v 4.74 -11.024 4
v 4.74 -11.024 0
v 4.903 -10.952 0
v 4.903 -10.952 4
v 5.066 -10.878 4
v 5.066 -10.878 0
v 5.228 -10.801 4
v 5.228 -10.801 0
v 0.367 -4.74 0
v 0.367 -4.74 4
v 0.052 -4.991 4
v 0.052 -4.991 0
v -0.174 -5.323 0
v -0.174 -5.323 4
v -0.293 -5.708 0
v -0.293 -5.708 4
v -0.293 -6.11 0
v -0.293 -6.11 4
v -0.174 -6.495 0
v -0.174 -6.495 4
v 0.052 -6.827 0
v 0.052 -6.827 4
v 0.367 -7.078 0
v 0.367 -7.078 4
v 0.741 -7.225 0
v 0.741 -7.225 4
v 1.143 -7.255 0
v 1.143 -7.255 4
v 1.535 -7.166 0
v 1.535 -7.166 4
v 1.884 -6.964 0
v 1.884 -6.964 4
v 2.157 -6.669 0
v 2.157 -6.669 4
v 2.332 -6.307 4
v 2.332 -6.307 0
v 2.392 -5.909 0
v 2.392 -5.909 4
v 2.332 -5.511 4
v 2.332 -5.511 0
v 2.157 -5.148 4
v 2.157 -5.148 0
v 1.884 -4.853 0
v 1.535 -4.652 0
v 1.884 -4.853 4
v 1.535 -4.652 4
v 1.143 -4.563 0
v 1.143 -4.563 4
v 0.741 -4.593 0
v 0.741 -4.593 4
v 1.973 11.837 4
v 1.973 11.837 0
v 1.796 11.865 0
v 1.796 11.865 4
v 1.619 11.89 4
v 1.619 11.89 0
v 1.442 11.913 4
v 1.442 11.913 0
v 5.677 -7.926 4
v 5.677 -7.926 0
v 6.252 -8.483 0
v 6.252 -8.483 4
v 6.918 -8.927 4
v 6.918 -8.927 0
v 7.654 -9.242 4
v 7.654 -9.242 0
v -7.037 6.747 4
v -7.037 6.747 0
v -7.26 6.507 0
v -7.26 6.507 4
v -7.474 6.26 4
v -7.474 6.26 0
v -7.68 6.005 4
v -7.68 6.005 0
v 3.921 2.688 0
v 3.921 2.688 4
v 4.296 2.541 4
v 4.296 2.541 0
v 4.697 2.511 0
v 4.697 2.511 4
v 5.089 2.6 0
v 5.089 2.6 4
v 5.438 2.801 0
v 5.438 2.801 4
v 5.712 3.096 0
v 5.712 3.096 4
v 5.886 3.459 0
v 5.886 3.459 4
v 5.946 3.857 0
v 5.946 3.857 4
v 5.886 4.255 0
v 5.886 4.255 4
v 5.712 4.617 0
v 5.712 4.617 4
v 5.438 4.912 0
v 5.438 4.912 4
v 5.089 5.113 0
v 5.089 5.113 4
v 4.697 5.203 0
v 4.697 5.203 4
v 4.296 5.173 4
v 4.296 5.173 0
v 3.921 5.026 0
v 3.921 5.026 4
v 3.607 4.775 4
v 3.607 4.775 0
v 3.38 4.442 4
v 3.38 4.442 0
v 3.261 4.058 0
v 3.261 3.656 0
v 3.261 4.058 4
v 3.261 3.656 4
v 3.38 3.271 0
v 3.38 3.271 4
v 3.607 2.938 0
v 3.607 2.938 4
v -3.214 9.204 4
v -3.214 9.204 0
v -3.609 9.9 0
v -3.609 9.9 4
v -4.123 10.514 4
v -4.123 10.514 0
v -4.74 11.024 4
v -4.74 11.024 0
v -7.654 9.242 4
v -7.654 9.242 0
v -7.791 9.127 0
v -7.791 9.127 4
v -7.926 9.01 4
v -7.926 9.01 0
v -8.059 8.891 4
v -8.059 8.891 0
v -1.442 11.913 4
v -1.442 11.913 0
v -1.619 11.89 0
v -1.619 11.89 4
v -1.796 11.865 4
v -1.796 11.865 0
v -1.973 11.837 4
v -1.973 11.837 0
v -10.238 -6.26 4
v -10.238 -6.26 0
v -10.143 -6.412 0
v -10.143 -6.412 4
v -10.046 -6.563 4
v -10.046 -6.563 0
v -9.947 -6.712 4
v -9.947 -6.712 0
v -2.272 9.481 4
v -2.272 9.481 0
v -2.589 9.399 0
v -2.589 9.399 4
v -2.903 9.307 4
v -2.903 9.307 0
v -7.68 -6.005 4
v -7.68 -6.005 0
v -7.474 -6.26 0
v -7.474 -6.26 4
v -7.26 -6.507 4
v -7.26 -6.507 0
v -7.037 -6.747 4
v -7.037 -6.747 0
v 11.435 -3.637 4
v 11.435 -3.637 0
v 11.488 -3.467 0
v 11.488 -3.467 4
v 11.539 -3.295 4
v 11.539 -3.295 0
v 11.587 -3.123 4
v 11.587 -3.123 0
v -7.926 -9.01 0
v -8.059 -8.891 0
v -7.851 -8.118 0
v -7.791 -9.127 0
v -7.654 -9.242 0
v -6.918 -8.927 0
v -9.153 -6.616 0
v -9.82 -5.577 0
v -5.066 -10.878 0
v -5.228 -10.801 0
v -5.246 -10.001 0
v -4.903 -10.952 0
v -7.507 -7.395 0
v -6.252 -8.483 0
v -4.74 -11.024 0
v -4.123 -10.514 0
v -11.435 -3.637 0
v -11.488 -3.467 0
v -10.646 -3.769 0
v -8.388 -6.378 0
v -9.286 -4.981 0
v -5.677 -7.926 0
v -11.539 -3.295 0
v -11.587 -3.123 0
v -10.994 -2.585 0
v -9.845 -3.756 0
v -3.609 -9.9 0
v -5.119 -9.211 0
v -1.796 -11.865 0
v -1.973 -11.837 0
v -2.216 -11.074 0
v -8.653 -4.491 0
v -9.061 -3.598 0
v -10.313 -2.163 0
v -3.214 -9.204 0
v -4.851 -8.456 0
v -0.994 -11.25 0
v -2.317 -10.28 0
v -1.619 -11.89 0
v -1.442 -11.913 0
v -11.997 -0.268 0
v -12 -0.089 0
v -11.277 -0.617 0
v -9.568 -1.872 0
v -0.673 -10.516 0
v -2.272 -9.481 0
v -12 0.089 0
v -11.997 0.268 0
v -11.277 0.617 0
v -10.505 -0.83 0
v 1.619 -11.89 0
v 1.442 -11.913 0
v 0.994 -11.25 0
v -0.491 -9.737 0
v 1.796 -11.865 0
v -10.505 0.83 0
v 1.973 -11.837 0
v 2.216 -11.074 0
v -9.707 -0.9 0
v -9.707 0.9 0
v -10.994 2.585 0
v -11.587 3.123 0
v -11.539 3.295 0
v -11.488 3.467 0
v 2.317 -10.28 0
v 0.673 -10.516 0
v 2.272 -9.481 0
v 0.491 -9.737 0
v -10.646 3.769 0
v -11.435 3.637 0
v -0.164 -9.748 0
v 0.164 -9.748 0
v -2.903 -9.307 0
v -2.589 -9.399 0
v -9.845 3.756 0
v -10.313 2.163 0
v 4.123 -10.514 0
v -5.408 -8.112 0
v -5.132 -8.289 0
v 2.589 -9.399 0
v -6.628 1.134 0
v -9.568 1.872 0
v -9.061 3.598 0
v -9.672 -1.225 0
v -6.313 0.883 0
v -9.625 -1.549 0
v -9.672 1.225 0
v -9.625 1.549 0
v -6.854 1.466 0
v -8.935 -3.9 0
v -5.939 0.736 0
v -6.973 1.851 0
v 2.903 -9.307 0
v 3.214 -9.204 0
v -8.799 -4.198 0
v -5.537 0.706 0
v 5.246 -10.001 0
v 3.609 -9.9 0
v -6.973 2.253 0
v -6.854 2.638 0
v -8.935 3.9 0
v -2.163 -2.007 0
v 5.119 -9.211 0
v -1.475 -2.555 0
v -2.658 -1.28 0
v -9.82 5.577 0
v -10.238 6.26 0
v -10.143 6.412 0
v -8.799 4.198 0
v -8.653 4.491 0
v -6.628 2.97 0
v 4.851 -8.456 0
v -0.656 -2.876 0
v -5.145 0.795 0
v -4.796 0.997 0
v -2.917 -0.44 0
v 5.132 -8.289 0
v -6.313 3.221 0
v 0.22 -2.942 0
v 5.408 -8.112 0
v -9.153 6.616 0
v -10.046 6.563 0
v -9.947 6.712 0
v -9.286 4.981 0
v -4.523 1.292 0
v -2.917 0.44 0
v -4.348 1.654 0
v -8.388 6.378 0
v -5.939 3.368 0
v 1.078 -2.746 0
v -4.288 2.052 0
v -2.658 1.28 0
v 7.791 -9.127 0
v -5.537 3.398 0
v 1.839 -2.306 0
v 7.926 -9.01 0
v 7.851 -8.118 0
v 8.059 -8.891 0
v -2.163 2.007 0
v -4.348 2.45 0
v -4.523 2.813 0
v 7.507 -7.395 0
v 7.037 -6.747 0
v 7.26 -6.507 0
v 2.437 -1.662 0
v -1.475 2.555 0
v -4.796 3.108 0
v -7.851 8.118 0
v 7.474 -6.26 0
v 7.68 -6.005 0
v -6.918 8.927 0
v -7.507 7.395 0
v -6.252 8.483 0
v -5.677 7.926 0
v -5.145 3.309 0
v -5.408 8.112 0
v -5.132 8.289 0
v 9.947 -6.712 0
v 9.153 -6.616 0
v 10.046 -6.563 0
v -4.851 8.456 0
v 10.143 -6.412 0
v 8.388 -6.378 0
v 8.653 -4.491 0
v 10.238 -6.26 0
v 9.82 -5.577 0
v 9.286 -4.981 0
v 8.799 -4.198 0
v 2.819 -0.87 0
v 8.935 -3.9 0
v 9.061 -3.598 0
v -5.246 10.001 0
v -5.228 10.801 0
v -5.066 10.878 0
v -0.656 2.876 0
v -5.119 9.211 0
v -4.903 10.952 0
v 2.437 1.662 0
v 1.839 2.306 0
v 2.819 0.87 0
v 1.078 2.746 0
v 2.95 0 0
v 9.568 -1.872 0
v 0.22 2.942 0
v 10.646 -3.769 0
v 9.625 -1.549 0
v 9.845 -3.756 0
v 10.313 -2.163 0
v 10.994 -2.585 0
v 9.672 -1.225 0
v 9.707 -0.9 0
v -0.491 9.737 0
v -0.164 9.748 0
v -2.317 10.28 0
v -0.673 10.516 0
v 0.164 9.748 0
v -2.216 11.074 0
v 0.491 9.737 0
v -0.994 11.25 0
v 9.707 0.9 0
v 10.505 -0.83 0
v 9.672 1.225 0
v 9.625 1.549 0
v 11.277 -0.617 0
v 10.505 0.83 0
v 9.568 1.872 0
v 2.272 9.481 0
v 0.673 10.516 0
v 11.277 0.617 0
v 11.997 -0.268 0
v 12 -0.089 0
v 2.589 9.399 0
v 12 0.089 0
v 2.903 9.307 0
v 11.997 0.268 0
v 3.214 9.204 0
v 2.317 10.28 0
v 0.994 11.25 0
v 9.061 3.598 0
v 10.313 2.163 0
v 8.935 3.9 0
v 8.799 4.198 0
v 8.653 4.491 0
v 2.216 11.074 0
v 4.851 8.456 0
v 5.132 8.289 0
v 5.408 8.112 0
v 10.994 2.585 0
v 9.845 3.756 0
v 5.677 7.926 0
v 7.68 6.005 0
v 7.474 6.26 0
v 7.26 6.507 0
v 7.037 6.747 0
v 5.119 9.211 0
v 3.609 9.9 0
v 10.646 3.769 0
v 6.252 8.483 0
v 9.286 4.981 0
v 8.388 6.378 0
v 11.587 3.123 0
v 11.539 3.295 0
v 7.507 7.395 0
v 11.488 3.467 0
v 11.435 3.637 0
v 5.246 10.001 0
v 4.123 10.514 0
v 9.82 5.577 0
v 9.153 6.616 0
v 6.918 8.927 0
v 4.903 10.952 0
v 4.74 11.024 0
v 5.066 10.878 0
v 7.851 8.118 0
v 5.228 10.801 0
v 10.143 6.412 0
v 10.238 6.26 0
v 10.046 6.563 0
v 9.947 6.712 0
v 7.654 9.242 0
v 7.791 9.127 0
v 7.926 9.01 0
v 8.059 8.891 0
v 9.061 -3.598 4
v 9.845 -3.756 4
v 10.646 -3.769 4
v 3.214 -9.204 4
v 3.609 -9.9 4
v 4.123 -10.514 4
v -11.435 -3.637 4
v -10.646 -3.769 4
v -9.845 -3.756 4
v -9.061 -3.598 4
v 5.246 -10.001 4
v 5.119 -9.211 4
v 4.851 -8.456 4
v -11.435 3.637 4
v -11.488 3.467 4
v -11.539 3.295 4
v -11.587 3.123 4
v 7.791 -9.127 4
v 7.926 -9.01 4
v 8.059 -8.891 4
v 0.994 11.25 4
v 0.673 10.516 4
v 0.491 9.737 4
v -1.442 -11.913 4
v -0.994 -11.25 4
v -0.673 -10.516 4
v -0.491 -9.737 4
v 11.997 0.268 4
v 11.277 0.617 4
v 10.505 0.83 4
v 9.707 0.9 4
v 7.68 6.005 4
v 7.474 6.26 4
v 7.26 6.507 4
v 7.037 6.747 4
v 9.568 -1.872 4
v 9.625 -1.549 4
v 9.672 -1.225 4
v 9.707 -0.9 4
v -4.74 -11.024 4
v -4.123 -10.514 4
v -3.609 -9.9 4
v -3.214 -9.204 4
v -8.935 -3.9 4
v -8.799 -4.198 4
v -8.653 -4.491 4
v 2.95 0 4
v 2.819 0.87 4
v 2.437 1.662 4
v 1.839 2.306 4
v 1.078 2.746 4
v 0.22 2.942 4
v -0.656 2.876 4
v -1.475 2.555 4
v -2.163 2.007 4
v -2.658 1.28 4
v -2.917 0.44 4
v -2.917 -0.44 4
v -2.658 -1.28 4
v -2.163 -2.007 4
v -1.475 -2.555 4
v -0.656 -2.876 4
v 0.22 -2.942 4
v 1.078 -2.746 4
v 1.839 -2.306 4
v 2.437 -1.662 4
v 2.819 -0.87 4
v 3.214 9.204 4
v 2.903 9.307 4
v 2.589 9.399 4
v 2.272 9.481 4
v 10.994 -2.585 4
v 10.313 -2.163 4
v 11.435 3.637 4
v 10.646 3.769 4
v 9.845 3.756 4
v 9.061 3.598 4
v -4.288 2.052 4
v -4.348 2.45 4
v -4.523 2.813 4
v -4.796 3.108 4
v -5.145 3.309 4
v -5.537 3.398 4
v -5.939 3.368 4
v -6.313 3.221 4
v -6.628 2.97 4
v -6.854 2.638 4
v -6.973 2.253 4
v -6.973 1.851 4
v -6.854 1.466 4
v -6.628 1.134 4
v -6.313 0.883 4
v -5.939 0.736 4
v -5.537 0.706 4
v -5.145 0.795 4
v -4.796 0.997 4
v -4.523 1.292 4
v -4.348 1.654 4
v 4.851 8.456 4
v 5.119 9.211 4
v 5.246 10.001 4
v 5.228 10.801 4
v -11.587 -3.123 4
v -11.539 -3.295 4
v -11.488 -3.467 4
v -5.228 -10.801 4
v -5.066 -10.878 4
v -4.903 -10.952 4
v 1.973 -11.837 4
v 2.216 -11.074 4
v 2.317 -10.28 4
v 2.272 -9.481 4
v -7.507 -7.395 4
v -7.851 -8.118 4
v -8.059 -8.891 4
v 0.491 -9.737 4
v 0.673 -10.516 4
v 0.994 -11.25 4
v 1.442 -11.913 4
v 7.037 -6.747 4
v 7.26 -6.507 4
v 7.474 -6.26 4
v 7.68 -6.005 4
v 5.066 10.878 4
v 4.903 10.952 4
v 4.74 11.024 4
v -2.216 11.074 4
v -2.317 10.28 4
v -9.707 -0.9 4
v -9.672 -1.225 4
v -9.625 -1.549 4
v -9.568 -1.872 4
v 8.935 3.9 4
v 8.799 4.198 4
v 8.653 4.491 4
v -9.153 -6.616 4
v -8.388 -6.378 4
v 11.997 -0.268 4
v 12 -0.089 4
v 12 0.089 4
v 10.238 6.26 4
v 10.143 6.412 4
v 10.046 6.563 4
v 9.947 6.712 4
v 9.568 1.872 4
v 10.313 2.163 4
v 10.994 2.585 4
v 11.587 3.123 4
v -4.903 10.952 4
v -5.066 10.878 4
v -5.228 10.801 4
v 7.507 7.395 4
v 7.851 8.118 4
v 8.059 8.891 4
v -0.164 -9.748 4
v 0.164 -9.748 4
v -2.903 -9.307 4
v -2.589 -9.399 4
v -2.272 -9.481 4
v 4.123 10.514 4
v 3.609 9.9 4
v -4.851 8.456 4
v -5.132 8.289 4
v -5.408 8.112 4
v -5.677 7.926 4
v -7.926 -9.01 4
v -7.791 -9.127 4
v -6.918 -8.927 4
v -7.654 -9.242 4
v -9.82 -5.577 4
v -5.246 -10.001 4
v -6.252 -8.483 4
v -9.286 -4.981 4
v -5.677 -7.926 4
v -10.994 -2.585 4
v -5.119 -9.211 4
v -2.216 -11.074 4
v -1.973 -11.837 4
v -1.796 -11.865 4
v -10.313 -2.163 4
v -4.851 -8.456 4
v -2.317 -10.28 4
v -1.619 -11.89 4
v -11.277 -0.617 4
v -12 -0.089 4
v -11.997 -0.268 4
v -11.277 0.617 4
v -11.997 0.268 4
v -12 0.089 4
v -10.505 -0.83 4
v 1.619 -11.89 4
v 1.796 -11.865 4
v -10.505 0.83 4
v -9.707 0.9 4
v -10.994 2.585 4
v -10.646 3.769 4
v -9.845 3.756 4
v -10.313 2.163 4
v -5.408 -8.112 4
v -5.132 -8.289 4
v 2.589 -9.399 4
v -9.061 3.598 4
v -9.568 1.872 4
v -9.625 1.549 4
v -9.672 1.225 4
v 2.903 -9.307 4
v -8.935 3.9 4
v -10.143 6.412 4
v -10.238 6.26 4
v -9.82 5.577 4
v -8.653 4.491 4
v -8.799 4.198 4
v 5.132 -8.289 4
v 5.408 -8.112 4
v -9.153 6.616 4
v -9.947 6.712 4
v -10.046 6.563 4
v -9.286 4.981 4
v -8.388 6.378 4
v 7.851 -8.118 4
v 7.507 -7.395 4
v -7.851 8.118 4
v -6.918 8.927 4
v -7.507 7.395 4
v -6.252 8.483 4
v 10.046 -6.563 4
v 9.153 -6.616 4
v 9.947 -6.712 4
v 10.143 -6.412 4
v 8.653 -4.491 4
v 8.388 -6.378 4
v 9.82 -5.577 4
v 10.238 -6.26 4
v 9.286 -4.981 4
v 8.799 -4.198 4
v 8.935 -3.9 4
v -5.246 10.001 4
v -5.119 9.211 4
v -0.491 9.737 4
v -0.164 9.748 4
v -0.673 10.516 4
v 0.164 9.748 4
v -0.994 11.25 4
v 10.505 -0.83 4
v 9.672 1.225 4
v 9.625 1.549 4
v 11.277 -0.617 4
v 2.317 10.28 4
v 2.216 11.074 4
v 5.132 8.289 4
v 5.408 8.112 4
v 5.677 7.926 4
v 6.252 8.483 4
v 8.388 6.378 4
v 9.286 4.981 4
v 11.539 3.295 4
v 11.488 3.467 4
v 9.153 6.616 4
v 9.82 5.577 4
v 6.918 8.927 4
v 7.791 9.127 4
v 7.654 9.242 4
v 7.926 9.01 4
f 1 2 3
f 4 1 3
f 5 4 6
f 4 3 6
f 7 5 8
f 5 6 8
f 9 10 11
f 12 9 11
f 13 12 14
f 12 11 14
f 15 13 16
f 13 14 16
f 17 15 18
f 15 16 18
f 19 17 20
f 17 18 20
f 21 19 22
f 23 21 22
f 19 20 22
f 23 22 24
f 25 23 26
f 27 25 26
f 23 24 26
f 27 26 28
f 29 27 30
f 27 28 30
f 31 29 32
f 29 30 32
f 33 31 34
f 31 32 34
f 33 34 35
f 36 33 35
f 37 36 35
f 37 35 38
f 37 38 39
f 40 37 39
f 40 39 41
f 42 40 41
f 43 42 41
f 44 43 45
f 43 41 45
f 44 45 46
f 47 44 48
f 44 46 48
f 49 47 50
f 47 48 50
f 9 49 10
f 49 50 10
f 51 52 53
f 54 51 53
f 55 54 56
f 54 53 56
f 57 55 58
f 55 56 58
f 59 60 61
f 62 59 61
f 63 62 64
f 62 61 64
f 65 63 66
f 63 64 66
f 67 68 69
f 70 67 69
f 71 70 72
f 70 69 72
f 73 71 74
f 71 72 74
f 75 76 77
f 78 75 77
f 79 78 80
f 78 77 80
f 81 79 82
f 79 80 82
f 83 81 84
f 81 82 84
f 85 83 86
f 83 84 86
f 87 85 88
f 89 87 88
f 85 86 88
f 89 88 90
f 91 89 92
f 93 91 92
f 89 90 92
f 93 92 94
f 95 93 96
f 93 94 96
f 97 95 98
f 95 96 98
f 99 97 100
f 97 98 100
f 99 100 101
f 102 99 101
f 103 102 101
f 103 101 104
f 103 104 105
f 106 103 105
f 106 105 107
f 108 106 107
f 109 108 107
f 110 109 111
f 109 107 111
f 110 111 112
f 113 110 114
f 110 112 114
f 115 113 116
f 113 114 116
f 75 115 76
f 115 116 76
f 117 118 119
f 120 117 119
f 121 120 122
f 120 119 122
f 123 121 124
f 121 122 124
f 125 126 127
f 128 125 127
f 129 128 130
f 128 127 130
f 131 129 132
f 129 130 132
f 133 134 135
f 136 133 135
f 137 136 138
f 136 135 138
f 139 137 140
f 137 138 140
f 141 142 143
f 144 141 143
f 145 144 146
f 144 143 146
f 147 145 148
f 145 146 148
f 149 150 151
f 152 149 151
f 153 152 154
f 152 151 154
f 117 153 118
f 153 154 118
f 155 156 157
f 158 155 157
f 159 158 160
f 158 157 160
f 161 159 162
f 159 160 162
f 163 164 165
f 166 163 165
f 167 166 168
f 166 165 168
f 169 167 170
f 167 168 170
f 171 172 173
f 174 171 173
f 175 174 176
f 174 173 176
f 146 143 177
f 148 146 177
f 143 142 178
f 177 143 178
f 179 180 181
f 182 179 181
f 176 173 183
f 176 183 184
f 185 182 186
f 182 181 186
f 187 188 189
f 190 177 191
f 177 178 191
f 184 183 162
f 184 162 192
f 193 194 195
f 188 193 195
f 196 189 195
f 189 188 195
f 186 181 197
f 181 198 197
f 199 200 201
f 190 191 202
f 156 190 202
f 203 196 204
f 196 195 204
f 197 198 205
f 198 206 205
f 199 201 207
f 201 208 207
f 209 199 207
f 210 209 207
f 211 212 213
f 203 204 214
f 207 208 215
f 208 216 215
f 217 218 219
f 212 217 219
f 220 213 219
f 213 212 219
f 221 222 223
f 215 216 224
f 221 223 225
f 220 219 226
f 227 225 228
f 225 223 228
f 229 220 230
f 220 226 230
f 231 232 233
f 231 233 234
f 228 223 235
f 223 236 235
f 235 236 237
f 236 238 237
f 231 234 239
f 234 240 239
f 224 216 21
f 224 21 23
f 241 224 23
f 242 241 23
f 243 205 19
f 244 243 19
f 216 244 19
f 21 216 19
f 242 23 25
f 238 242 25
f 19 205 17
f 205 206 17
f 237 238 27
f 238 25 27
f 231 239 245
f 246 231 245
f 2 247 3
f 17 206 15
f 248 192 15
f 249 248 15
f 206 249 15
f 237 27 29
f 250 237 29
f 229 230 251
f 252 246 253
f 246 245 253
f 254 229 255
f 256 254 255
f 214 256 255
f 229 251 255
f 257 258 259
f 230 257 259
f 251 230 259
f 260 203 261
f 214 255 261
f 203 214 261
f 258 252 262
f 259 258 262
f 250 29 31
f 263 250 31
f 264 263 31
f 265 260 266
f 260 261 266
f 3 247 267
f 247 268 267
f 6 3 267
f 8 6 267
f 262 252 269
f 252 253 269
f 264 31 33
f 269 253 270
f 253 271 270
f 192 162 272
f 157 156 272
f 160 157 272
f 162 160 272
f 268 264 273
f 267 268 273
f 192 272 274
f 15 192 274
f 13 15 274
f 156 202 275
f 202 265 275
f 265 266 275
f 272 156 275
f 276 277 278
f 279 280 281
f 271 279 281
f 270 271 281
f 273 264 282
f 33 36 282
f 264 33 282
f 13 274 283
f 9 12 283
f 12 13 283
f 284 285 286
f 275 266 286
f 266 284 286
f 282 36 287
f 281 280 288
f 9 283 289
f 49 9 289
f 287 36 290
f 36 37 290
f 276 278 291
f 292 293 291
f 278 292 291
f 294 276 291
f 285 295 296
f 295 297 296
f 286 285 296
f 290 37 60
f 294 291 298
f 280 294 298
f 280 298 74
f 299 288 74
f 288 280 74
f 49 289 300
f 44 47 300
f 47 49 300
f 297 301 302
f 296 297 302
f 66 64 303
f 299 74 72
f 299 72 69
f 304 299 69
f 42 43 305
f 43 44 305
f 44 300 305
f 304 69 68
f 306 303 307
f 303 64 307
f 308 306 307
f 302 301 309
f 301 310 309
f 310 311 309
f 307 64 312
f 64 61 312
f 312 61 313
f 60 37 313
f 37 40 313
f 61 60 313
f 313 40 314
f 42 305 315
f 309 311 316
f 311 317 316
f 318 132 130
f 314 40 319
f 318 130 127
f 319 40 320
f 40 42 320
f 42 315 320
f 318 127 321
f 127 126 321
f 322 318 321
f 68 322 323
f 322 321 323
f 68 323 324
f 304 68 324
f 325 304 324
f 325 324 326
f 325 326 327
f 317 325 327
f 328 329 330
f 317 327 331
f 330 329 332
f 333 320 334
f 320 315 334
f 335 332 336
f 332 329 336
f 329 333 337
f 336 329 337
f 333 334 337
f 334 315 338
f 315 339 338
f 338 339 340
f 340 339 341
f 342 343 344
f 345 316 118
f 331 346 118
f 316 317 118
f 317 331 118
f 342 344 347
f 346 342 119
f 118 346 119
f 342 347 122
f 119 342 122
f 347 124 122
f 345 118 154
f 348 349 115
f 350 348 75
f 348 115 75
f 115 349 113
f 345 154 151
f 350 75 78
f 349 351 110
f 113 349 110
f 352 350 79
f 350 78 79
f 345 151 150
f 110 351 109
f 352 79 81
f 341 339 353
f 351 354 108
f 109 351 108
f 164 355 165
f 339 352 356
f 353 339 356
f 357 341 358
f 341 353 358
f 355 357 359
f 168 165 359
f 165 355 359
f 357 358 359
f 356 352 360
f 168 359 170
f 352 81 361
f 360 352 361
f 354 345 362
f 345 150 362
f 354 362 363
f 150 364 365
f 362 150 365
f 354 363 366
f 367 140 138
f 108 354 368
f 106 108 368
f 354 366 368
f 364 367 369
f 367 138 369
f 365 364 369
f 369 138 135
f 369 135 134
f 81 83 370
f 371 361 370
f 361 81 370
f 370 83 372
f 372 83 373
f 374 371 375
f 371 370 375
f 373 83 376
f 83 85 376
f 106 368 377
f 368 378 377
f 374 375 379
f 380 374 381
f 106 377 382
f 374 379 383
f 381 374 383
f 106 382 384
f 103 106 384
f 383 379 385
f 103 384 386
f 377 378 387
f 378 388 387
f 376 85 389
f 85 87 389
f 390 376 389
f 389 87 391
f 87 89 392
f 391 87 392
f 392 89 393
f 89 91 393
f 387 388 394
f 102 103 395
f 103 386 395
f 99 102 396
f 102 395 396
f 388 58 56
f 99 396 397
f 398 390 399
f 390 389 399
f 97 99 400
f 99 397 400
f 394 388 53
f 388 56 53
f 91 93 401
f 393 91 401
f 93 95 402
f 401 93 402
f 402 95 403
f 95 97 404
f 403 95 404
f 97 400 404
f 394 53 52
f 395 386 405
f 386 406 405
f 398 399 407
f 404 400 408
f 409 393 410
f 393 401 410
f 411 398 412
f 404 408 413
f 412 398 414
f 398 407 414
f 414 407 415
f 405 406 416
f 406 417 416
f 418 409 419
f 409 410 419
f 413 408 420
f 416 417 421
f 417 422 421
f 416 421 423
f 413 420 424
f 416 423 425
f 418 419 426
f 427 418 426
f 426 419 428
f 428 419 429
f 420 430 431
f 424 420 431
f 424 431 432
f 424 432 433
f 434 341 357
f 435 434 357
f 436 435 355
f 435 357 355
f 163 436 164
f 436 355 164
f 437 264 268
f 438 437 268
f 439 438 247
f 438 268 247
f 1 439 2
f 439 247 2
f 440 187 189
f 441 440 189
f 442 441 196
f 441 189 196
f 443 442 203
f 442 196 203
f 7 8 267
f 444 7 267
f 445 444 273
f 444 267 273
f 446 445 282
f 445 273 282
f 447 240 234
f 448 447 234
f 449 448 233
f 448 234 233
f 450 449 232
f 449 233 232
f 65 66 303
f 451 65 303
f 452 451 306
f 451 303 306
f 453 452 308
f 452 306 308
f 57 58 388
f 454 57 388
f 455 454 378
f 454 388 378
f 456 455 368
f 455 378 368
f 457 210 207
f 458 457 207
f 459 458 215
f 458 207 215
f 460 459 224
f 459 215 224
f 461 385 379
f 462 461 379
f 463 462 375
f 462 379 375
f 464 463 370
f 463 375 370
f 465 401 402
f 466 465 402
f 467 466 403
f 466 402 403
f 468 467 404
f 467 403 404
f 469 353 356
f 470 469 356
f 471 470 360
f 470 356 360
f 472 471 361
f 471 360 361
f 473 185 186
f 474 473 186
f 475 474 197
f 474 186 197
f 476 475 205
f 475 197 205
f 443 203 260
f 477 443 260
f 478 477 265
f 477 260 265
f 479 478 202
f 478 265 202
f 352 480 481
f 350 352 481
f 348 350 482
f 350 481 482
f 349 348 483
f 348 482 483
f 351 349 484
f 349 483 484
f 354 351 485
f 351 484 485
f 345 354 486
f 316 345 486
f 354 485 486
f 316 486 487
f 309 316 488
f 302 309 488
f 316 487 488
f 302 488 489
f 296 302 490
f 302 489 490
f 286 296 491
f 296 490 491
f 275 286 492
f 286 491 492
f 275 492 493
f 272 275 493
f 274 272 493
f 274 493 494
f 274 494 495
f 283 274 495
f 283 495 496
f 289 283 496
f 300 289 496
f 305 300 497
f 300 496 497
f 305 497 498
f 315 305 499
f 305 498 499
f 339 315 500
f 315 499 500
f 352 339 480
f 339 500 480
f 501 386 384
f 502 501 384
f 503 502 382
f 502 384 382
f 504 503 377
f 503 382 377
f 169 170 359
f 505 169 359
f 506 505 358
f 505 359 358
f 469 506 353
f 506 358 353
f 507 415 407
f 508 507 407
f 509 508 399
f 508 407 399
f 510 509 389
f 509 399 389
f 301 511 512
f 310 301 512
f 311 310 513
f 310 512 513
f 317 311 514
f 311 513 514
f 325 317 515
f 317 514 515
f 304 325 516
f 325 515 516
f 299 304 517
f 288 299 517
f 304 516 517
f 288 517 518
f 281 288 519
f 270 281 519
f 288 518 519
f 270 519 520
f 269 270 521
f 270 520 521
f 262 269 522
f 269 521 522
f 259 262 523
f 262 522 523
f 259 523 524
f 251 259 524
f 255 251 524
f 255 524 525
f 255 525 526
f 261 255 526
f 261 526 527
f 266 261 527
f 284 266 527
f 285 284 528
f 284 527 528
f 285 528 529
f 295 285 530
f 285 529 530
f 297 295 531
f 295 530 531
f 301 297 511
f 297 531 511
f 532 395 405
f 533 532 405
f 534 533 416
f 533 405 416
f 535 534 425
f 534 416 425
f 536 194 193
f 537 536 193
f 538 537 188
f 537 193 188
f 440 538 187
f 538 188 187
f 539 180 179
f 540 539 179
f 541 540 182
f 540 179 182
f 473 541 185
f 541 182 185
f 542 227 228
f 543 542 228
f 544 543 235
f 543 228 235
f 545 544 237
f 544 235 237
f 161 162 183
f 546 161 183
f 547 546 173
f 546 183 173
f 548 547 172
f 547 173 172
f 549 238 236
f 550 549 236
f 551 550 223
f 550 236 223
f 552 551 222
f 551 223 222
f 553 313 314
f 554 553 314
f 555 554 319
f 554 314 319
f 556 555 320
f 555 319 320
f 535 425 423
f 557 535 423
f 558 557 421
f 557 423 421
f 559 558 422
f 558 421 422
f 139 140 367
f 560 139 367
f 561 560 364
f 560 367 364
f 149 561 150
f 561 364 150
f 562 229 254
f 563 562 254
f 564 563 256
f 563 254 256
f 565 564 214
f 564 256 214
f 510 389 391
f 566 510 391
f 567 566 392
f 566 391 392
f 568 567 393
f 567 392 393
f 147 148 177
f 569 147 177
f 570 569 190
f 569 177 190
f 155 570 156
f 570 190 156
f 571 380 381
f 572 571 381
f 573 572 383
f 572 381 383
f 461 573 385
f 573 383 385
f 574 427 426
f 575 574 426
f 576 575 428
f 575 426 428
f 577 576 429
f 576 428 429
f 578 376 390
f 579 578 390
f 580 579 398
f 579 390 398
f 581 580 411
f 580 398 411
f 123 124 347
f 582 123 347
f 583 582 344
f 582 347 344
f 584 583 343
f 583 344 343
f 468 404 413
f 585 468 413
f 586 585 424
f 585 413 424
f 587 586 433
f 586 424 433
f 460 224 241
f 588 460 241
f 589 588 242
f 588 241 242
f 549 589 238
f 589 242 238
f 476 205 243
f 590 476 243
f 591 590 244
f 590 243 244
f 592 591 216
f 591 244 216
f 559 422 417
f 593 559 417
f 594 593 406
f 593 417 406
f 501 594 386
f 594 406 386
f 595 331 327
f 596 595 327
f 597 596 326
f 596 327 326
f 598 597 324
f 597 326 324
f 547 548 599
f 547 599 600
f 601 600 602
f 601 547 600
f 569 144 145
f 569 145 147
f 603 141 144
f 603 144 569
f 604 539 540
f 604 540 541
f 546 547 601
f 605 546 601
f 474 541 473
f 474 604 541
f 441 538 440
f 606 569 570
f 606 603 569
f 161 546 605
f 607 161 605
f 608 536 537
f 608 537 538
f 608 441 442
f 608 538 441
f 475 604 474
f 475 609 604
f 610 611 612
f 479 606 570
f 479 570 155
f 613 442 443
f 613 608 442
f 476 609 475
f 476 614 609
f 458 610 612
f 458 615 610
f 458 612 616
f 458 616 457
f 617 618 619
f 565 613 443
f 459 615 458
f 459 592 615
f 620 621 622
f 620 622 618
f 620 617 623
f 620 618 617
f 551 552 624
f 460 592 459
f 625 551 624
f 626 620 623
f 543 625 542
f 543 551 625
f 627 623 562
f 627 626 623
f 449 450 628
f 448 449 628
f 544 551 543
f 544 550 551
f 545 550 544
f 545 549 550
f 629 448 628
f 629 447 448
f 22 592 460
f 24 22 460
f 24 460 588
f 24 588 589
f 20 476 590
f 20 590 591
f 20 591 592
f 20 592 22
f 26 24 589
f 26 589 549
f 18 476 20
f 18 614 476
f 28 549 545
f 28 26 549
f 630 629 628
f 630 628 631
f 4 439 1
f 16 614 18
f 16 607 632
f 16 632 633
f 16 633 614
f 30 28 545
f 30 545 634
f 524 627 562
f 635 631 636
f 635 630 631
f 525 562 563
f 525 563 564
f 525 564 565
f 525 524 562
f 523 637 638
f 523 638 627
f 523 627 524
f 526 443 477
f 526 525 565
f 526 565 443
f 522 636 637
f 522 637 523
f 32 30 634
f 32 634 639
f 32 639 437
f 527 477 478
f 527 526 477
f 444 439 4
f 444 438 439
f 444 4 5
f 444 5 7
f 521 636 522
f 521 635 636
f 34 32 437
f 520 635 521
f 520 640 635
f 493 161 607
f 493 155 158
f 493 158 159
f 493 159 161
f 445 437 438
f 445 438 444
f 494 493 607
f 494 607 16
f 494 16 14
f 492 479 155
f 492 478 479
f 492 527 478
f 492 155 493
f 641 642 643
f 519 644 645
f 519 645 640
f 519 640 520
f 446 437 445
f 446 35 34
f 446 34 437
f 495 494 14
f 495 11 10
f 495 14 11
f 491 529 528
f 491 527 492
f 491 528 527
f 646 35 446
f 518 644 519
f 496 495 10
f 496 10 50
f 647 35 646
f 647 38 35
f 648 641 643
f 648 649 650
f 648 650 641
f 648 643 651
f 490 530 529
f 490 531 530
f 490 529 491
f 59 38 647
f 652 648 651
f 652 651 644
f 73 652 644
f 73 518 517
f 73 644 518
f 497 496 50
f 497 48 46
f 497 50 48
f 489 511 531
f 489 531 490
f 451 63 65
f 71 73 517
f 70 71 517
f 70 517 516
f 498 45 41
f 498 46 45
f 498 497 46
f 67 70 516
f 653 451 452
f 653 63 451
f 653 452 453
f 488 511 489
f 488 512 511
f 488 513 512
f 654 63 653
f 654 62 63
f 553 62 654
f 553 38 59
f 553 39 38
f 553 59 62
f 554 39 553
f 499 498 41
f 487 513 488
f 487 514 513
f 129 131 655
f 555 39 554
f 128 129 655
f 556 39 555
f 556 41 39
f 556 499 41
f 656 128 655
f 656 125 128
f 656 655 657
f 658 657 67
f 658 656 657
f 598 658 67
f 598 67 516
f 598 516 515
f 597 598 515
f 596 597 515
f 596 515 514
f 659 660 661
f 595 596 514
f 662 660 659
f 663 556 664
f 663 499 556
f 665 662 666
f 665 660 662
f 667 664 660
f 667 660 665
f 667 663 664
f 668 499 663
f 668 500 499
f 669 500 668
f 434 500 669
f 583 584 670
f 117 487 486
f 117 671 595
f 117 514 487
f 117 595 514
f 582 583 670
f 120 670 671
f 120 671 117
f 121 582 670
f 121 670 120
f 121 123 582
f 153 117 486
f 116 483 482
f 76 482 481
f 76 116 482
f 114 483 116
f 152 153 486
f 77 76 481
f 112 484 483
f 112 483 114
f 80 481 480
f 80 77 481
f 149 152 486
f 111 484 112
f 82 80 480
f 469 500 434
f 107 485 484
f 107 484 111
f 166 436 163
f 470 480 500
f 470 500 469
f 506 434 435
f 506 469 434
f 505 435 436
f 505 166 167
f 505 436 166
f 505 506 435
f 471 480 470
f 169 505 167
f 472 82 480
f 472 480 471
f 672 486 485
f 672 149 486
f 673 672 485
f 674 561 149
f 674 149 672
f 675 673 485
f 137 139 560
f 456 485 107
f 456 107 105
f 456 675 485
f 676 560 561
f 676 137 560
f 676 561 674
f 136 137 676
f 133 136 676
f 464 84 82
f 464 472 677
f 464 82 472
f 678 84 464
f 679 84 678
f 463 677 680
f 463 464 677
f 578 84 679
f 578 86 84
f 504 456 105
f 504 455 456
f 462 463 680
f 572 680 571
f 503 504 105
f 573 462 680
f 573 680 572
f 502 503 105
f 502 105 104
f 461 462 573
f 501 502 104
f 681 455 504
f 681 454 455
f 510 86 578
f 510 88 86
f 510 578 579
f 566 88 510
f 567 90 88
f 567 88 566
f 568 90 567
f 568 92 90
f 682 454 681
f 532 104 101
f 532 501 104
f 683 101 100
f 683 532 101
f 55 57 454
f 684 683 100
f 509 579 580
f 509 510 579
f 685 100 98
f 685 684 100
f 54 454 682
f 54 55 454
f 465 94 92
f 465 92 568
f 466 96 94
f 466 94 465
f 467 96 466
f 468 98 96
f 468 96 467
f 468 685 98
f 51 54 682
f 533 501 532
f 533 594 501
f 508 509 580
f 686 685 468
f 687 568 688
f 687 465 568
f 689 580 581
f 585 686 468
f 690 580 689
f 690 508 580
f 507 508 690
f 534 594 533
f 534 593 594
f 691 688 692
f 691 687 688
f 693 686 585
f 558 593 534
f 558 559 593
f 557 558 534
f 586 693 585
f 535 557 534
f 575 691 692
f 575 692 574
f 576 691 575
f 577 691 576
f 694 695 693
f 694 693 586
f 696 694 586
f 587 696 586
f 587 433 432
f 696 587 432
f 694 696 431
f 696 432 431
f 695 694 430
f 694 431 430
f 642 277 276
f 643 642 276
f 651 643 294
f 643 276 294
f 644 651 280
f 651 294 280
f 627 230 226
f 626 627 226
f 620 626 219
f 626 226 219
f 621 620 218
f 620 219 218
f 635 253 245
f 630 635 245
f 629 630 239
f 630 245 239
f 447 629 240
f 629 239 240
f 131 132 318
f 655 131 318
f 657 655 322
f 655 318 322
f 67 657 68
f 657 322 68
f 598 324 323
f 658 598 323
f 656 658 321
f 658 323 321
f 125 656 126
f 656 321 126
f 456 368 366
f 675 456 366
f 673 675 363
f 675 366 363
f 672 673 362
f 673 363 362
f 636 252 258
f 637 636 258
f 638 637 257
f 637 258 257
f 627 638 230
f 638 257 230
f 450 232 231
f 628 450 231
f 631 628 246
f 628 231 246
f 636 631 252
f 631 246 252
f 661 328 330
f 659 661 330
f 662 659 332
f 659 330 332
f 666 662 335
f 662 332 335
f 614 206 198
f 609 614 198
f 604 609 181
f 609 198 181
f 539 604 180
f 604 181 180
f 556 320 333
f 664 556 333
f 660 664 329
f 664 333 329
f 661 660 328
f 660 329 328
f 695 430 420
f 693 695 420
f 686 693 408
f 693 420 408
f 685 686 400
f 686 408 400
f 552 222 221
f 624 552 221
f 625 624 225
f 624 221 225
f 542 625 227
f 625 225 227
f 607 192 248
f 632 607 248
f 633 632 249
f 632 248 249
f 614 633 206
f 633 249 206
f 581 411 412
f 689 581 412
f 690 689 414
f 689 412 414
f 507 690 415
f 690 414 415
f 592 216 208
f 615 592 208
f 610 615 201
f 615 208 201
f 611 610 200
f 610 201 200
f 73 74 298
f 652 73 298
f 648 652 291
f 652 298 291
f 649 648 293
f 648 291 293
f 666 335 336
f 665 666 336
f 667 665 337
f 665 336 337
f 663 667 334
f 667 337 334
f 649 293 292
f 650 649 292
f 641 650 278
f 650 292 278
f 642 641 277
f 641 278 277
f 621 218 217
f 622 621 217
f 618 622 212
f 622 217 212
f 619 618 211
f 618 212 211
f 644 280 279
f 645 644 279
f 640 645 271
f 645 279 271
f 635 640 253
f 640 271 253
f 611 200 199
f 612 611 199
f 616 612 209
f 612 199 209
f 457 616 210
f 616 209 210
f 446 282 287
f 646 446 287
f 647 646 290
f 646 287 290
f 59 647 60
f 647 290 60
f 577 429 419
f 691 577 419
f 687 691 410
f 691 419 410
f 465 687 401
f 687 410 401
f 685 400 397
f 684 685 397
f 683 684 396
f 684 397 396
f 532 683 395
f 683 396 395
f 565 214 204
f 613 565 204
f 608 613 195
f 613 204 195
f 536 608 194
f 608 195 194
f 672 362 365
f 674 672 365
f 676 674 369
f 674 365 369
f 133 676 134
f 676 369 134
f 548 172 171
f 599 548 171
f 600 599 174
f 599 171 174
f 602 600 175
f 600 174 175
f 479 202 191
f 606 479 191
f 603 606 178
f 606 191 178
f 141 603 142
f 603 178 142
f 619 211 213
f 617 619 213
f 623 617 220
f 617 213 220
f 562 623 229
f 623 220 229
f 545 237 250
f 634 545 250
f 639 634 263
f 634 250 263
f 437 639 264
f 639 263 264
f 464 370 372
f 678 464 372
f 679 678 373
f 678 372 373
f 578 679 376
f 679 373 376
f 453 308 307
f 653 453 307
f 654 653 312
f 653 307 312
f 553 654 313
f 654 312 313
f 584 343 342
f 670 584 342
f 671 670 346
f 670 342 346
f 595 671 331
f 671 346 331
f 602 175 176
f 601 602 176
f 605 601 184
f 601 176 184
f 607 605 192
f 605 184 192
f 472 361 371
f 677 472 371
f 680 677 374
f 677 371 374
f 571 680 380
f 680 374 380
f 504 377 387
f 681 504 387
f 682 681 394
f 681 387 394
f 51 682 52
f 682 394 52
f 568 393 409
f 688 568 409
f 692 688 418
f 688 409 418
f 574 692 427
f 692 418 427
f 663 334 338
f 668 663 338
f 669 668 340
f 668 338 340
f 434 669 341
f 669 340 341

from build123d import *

# Parameters (mm, degrees)
MODEL_R             = 2.5
BOSS_EXTRUDE1_DEPTH = 4
SKETCH2_R           = 2.95
CUT_EXTRUDE1_DEPTH  = 4
SKETCH3_R           = 1.35
CUT_EXTRUDE2_DEPTH  = 4
CIRPATTERN1_COUNT   = 3


with BuildPart() as part:
    # Model → Boss-Extrude1 (new body)
    with BuildSketch(Plane.XY):
        with BuildLine():
            ThreePointArc((-11.997000624, 0.268283487), (-12, 0), (-11.997000624, -0.268283487))
            ThreePointArc((-11.997000624, -0.268283487), (-10.895606779, -0.741380557), (-9.707399683, -0.89966238))
            ThreePointArc((-9.707399683, -0.89966238), (-9.649769237, -1.387427358), (-9.56764597, -1.8716708))
            ThreePointArc((-9.56764597, -1.8716708), (-10.663129188, -2.358297721), (-11.586621996, -3.122529539))
            ThreePointArc((-11.586621996, -3.122529539), (-11.513915683, -3.380790682), (-11.43545361, -3.637361781))
            ThreePointArc((-11.43545361, -3.637361781), (-10.245387108, -3.780996591), (-9.060717605, -3.598110265))
            ThreePointArc((-9.060717605, -3.598110265), (-8.868002323, -4.049880962), (-8.652778483, -4.491372344))
            ThreePointArc((-8.652778483, -4.491372344), (-9.566788286, -5.266920743), (-10.237564162, -6.260373793))
            ThreePointArc((-10.237564162, -6.260373793), (-10.095042394, -6.487689809), (-9.947474154, -6.711762656))
            ThreePointArc((-9.947474154, -6.711762656), (-8.765147105, -6.514298768), (-7.679990073, -6.005060656))
            ThreePointArc((-7.679990073, -6.005060656), (-7.3678026, -6.384237295), (-7.036914342, -6.747209612))
            ThreePointArc((-7.036914342, -6.747209612), (-7.695403093, -7.74884917), (-8.059119765, -8.891039794))
            ThreePointArc((-8.059119765, -8.891039794), (-7.858328807, -9.068994892), (-7.653609502, -9.242416436))
            ThreePointArc((-7.653609502, -9.242416436), (-6.574807012, -8.719851201), (-5.67707542, -7.925516745))
            ThreePointArc((-5.67707542, -7.925516745), (-5.270707329, -8.201380692), (-4.850961252, -8.456428084))
            ThreePointArc((-4.850961252, -8.456428084), (-5.200582107, -9.603011921), (-5.227773414, -10.801406627))
            ThreePointArc((-5.227773414, -10.801406627), (-4.984980156, -10.915583944), (-4.739694926, -11.024304604))
            ThreePointArc((-4.739694926, -11.024304604), (-3.851815156, -10.218973149), (-3.214237879, -9.203894603))
            ThreePointArc((-3.214237879, -9.203894603), (-2.746610697, -9.354097), (-2.27201213, -9.480557045))
            ThreePointArc((-2.27201213, -9.480557045), (-2.284440889, -10.679195758), (-1.972903952, -11.836707735))
            ThreePointArc((-1.972903952, -11.836707735), (-1.707778059, -11.877857303), (-1.441798455, -11.913069177))
            ThreePointArc((-1.441798455, -11.913069177), (-0.816772145, -10.890214666), (-0.491001901, -9.736627657))
            ThreePointArc((-0.491001901, -9.736627657), (0, -9.749), (0.491001901, -9.736627657))
            ThreePointArc((0.491001901, -9.736627657), (0.816772145, -10.890214666), (1.441798455, -11.913069177))
            ThreePointArc((1.441798455, -11.913069177), (1.707778059, -11.877857303), (1.972903952, -11.836707735))
            ThreePointArc((1.972903952, -11.836707735), (2.284440889, -10.679195758), (2.27201213, -9.480557045))
            ThreePointArc((2.27201213, -9.480557045), (2.746610697, -9.354097), (3.214237879, -9.203894603))
            ThreePointArc((3.214237879, -9.203894603), (3.851815156, -10.218973149), (4.739694926, -11.024304604))
            ThreePointArc((4.739694926, -11.024304604), (4.984980156, -10.915583944), (5.227773414, -10.801406627))
            ThreePointArc((5.227773414, -10.801406627), (5.200582107, -9.603011921), (4.850961252, -8.456428084))
            ThreePointArc((4.850961252, -8.456428084), (5.270707329, -8.201380692), (5.67707542, -7.925516745))
            ThreePointArc((5.67707542, -7.925516745), (6.574807012, -8.719851201), (7.653609502, -9.242416436))
            ThreePointArc((7.653609502, -9.242416436), (7.858328807, -9.068994892), (8.059119765, -8.891039794))
            ThreePointArc((8.059119765, -8.891039794), (7.695403093, -7.74884917), (7.036914342, -6.747209612))
            ThreePointArc((7.036914342, -6.747209612), (7.3678026, -6.384237295), (7.679990073, -6.005060656))
            ThreePointArc((7.679990073, -6.005060656), (8.765147105, -6.514298768), (9.947474154, -6.711762656))
            ThreePointArc((9.947474154, -6.711762656), (10.095042394, -6.487689809), (10.237564162, -6.260373793))
            ThreePointArc((10.237564162, -6.260373793), (9.566788286, -5.266920743), (8.652778482, -4.491372344))
            ThreePointArc((8.652778482, -4.491372344), (8.868002323, -4.049880962), (9.060717605, -3.598110265))
            ThreePointArc((9.060717605, -3.598110265), (10.245387108, -3.780996591), (11.43545361, -3.637361781))
            ThreePointArc((11.43545361, -3.637361781), (11.513915683, -3.380790682), (11.586621996, -3.122529539))
            ThreePointArc((11.586621996, -3.122529539), (10.663129188, -2.358297721), (9.56764597, -1.8716708))
            ThreePointArc((9.56764597, -1.8716708), (9.649769237, -1.387427358), (9.707399683, -0.89966238))
            ThreePointArc((9.707399683, -0.89966238), (10.895606779, -0.741380557), (11.997000624, -0.268283487))
            ThreePointArc((11.997000624, -0.268283487), (12, 0), (11.997000624, 0.268283487))
            ThreePointArc((11.997000624, 0.268283487), (10.895606779, 0.741380557), (9.707399683, 0.89966238))
            ThreePointArc((9.707399683, 0.89966238), (9.649769237, 1.387427358), (9.56764597, 1.8716708))
            ThreePointArc((9.56764597, 1.8716708), (10.663129188, 2.358297721), (11.586621996, 3.122529539))
            ThreePointArc((11.586621996, 3.122529539), (11.513915683, 3.380790682), (11.43545361, 3.637361781))
            ThreePointArc((11.43545361, 3.637361781), (10.245387108, 3.780996591), (9.060717605, 3.598110265))
            ThreePointArc((9.060717605, 3.598110265), (8.868002323, 4.049880962), (8.652778483, 4.491372344))
            ThreePointArc((8.652778483, 4.491372344), (9.566788286, 5.266920743), (10.237564162, 6.260373793))
            ThreePointArc((10.237564162, 6.260373793), (10.095042394, 6.487689809), (9.947474154, 6.711762656))
            ThreePointArc((9.947474154, 6.711762656), (8.765147105, 6.514298768), (7.679990073, 6.005060656))
            ThreePointArc((7.679990073, 6.005060656), (7.3678026, 6.384237295), (7.036914342, 6.747209612))
            ThreePointArc((7.036914342, 6.747209612), (7.695403093, 7.74884917), (8.059119765, 8.891039794))
            ThreePointArc((8.059119765, 8.891039794), (7.858328807, 9.068994892), (7.653609502, 9.242416436))
            ThreePointArc((7.653609502, 9.242416436), (6.574807012, 8.719851201), (5.67707542, 7.925516745))
            ThreePointArc((5.67707542, 7.925516745), (5.270707329, 8.201380692), (4.850961252, 8.456428084))
            ThreePointArc((4.850961252, 8.456428084), (5.200582107, 9.603011921), (5.227773414, 10.801406627))
            ThreePointArc((5.227773414, 10.801406627), (4.984980156, 10.915583944), (4.739694926, 11.024304604))
            ThreePointArc((4.739694926, 11.024304604), (3.851815156, 10.218973149), (3.214237879, 9.203894603))
            ThreePointArc((3.214237879, 9.203894603), (2.746610697, 9.354097), (2.27201213, 9.480557045))
            ThreePointArc((2.27201213, 9.480557045), (2.284440889, 10.679195758), (1.972903952, 11.836707735))
            ThreePointArc((1.972903952, 11.836707735), (1.707778059, 11.877857303), (1.441798455, 11.913069177))
            ThreePointArc((1.441798455, 11.913069177), (0.816772145, 10.890214666), (0.491001901, 9.736627657))
            ThreePointArc((0.491001901, 9.736627657), (0, 9.749), (-0.491001901, 9.736627657))
            ThreePointArc((-0.491001901, 9.736627657), (-0.816772145, 10.890214666), (-1.441798455, 11.913069177))
            ThreePointArc((-1.441798455, 11.913069177), (-1.707778059, 11.877857303), (-1.972903952, 11.836707735))
            ThreePointArc((-1.972903952, 11.836707735), (-2.284440889, 10.679195758), (-2.27201213, 9.480557045))
            ThreePointArc((-2.27201213, 9.480557045), (-2.746610697, 9.354097), (-3.214237879, 9.203894603))
            ThreePointArc((-3.214237879, 9.203894603), (-3.851815156, 10.218973149), (-4.739694926, 11.024304604))
            ThreePointArc((-4.739694926, 11.024304604), (-4.984980156, 10.915583944), (-5.227773414, 10.801406627))
            ThreePointArc((-5.227773414, 10.801406627), (-5.200582107, 9.603011921), (-4.850961252, 8.456428084))
            ThreePointArc((-4.850961252, 8.456428084), (-5.270707329, 8.201380692), (-5.67707542, 7.925516745))
            ThreePointArc((-5.67707542, 7.925516745), (-6.574807012, 8.719851201), (-7.653609502, 9.242416436))
            ThreePointArc((-7.653609502, 9.242416436), (-7.858328807, 9.068994892), (-8.059119765, 8.891039794))
            ThreePointArc((-8.059119765, 8.891039794), (-7.695403093, 7.74884917), (-7.036914342, 6.747209612))
            ThreePointArc((-7.036914342, 6.747209612), (-7.3678026, 6.384237295), (-7.679990073, 6.005060656))
            ThreePointArc((-7.679990073, 6.005060656), (-8.765147105, 6.514298768), (-9.947474154, 6.711762656))
            ThreePointArc((-9.947474154, 6.711762656), (-10.095042394, 6.487689809), (-10.237564162, 6.260373793))
            ThreePointArc((-10.237564162, 6.260373793), (-9.566788286, 5.266920743), (-8.652778482, 4.491372344))
            ThreePointArc((-8.652778482, 4.491372344), (-8.868002323, 4.049880962), (-9.060717605, 3.598110265))
            ThreePointArc((-9.060717605, 3.598110265), (-10.245387108, 3.780996591), (-11.43545361, 3.637361781))
            ThreePointArc((-11.43545361, 3.637361781), (-11.513915683, 3.380790682), (-11.586621996, 3.122529539))
            ThreePointArc((-11.586621996, 3.122529539), (-10.663129188, 2.358297721), (-9.56764597, 1.8716708))
            ThreePointArc((-9.56764597, 1.8716708), (-9.649769237, 1.387427358), (-9.707399683, 0.89966238))
            ThreePointArc((-9.707399683, 0.89966238), (-10.895606779, 0.741380557), (-11.997000624, 0.268283487))
        make_face()
        Circle(MODEL_R, mode=Mode.SUBTRACT)
    extrude(amount=BOSS_EXTRUDE1_DEPTH)

    # Sketch2 → Cut-Extrude1 (cut)
    with BuildSketch(Plane.XY.offset(4)):
        Circle(SKETCH2_R)
    extrude(amount=-CUT_EXTRUDE1_DEPTH, mode=Mode.SUBTRACT)

    # Sketch3 → Cut-Extrude2 (cut)
    with BuildSketch(Plane.XY.offset(4)):
        with Locations((-5.638155725, 2.05212086)):
            Circle(SKETCH3_R)
    cut_extrude2 = extrude(amount=-CUT_EXTRUDE2_DEPTH, mode=Mode.SUBTRACT)

    # CirPattern1: Cut-Extrude2 ×3 about axis
    cirpattern1_axis = Axis((0, 0, 0), (0, 0, 1))
    for i in range(1, CIRPATTERN1_COUNT):
        add(cut_extrude2.rotate(cirpattern1_axis, i * 360 / CIRPATTERN1_COUNT), mode=Mode.SUBTRACT)


solid = part.part
